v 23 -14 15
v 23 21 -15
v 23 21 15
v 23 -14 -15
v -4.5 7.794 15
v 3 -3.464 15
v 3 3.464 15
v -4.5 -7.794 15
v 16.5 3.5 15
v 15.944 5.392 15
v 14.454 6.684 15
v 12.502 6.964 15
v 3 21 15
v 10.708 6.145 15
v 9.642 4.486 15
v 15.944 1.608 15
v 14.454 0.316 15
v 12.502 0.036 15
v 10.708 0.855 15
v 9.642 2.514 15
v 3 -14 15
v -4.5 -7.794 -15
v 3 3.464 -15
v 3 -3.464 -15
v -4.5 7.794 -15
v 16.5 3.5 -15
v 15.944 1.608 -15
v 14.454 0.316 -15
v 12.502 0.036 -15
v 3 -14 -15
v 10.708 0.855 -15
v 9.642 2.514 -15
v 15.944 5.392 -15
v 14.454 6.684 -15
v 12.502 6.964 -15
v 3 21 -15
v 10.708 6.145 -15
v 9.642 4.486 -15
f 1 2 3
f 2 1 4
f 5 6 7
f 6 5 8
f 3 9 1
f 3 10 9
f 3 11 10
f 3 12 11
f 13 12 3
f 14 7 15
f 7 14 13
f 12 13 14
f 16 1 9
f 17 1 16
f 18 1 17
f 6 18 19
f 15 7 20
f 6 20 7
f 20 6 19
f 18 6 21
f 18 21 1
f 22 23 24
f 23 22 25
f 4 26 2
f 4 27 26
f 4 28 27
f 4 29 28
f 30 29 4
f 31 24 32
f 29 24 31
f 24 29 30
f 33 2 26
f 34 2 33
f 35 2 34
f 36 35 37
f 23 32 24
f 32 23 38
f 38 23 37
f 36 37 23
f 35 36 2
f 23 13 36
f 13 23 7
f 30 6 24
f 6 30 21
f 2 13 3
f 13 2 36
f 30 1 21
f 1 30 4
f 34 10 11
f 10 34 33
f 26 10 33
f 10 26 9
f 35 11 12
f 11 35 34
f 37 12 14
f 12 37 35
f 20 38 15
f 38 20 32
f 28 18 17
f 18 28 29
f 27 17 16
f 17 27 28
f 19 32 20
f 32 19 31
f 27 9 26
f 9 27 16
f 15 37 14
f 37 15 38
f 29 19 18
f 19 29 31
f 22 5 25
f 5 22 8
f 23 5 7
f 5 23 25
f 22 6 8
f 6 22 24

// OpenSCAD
use <MCAD/gears.scad>

block_depth = 35;
block_width = 20;
block_height = 30;
dovetail_radius_female = 10;
dovetail_radius_male = 9;

cylinder(block_height, r=dovetail_radius_male, $fn=3,
center=true);

translate([block_width / 2 + 3, 3.5, 0]) {
    difference() {
        cube([block_width, block_depth, 
           block_height], center=true);
        
        hole_diameter = 7;
        cylinder(block_height + 1, d=hole_diameter, center=true);
    }
}
